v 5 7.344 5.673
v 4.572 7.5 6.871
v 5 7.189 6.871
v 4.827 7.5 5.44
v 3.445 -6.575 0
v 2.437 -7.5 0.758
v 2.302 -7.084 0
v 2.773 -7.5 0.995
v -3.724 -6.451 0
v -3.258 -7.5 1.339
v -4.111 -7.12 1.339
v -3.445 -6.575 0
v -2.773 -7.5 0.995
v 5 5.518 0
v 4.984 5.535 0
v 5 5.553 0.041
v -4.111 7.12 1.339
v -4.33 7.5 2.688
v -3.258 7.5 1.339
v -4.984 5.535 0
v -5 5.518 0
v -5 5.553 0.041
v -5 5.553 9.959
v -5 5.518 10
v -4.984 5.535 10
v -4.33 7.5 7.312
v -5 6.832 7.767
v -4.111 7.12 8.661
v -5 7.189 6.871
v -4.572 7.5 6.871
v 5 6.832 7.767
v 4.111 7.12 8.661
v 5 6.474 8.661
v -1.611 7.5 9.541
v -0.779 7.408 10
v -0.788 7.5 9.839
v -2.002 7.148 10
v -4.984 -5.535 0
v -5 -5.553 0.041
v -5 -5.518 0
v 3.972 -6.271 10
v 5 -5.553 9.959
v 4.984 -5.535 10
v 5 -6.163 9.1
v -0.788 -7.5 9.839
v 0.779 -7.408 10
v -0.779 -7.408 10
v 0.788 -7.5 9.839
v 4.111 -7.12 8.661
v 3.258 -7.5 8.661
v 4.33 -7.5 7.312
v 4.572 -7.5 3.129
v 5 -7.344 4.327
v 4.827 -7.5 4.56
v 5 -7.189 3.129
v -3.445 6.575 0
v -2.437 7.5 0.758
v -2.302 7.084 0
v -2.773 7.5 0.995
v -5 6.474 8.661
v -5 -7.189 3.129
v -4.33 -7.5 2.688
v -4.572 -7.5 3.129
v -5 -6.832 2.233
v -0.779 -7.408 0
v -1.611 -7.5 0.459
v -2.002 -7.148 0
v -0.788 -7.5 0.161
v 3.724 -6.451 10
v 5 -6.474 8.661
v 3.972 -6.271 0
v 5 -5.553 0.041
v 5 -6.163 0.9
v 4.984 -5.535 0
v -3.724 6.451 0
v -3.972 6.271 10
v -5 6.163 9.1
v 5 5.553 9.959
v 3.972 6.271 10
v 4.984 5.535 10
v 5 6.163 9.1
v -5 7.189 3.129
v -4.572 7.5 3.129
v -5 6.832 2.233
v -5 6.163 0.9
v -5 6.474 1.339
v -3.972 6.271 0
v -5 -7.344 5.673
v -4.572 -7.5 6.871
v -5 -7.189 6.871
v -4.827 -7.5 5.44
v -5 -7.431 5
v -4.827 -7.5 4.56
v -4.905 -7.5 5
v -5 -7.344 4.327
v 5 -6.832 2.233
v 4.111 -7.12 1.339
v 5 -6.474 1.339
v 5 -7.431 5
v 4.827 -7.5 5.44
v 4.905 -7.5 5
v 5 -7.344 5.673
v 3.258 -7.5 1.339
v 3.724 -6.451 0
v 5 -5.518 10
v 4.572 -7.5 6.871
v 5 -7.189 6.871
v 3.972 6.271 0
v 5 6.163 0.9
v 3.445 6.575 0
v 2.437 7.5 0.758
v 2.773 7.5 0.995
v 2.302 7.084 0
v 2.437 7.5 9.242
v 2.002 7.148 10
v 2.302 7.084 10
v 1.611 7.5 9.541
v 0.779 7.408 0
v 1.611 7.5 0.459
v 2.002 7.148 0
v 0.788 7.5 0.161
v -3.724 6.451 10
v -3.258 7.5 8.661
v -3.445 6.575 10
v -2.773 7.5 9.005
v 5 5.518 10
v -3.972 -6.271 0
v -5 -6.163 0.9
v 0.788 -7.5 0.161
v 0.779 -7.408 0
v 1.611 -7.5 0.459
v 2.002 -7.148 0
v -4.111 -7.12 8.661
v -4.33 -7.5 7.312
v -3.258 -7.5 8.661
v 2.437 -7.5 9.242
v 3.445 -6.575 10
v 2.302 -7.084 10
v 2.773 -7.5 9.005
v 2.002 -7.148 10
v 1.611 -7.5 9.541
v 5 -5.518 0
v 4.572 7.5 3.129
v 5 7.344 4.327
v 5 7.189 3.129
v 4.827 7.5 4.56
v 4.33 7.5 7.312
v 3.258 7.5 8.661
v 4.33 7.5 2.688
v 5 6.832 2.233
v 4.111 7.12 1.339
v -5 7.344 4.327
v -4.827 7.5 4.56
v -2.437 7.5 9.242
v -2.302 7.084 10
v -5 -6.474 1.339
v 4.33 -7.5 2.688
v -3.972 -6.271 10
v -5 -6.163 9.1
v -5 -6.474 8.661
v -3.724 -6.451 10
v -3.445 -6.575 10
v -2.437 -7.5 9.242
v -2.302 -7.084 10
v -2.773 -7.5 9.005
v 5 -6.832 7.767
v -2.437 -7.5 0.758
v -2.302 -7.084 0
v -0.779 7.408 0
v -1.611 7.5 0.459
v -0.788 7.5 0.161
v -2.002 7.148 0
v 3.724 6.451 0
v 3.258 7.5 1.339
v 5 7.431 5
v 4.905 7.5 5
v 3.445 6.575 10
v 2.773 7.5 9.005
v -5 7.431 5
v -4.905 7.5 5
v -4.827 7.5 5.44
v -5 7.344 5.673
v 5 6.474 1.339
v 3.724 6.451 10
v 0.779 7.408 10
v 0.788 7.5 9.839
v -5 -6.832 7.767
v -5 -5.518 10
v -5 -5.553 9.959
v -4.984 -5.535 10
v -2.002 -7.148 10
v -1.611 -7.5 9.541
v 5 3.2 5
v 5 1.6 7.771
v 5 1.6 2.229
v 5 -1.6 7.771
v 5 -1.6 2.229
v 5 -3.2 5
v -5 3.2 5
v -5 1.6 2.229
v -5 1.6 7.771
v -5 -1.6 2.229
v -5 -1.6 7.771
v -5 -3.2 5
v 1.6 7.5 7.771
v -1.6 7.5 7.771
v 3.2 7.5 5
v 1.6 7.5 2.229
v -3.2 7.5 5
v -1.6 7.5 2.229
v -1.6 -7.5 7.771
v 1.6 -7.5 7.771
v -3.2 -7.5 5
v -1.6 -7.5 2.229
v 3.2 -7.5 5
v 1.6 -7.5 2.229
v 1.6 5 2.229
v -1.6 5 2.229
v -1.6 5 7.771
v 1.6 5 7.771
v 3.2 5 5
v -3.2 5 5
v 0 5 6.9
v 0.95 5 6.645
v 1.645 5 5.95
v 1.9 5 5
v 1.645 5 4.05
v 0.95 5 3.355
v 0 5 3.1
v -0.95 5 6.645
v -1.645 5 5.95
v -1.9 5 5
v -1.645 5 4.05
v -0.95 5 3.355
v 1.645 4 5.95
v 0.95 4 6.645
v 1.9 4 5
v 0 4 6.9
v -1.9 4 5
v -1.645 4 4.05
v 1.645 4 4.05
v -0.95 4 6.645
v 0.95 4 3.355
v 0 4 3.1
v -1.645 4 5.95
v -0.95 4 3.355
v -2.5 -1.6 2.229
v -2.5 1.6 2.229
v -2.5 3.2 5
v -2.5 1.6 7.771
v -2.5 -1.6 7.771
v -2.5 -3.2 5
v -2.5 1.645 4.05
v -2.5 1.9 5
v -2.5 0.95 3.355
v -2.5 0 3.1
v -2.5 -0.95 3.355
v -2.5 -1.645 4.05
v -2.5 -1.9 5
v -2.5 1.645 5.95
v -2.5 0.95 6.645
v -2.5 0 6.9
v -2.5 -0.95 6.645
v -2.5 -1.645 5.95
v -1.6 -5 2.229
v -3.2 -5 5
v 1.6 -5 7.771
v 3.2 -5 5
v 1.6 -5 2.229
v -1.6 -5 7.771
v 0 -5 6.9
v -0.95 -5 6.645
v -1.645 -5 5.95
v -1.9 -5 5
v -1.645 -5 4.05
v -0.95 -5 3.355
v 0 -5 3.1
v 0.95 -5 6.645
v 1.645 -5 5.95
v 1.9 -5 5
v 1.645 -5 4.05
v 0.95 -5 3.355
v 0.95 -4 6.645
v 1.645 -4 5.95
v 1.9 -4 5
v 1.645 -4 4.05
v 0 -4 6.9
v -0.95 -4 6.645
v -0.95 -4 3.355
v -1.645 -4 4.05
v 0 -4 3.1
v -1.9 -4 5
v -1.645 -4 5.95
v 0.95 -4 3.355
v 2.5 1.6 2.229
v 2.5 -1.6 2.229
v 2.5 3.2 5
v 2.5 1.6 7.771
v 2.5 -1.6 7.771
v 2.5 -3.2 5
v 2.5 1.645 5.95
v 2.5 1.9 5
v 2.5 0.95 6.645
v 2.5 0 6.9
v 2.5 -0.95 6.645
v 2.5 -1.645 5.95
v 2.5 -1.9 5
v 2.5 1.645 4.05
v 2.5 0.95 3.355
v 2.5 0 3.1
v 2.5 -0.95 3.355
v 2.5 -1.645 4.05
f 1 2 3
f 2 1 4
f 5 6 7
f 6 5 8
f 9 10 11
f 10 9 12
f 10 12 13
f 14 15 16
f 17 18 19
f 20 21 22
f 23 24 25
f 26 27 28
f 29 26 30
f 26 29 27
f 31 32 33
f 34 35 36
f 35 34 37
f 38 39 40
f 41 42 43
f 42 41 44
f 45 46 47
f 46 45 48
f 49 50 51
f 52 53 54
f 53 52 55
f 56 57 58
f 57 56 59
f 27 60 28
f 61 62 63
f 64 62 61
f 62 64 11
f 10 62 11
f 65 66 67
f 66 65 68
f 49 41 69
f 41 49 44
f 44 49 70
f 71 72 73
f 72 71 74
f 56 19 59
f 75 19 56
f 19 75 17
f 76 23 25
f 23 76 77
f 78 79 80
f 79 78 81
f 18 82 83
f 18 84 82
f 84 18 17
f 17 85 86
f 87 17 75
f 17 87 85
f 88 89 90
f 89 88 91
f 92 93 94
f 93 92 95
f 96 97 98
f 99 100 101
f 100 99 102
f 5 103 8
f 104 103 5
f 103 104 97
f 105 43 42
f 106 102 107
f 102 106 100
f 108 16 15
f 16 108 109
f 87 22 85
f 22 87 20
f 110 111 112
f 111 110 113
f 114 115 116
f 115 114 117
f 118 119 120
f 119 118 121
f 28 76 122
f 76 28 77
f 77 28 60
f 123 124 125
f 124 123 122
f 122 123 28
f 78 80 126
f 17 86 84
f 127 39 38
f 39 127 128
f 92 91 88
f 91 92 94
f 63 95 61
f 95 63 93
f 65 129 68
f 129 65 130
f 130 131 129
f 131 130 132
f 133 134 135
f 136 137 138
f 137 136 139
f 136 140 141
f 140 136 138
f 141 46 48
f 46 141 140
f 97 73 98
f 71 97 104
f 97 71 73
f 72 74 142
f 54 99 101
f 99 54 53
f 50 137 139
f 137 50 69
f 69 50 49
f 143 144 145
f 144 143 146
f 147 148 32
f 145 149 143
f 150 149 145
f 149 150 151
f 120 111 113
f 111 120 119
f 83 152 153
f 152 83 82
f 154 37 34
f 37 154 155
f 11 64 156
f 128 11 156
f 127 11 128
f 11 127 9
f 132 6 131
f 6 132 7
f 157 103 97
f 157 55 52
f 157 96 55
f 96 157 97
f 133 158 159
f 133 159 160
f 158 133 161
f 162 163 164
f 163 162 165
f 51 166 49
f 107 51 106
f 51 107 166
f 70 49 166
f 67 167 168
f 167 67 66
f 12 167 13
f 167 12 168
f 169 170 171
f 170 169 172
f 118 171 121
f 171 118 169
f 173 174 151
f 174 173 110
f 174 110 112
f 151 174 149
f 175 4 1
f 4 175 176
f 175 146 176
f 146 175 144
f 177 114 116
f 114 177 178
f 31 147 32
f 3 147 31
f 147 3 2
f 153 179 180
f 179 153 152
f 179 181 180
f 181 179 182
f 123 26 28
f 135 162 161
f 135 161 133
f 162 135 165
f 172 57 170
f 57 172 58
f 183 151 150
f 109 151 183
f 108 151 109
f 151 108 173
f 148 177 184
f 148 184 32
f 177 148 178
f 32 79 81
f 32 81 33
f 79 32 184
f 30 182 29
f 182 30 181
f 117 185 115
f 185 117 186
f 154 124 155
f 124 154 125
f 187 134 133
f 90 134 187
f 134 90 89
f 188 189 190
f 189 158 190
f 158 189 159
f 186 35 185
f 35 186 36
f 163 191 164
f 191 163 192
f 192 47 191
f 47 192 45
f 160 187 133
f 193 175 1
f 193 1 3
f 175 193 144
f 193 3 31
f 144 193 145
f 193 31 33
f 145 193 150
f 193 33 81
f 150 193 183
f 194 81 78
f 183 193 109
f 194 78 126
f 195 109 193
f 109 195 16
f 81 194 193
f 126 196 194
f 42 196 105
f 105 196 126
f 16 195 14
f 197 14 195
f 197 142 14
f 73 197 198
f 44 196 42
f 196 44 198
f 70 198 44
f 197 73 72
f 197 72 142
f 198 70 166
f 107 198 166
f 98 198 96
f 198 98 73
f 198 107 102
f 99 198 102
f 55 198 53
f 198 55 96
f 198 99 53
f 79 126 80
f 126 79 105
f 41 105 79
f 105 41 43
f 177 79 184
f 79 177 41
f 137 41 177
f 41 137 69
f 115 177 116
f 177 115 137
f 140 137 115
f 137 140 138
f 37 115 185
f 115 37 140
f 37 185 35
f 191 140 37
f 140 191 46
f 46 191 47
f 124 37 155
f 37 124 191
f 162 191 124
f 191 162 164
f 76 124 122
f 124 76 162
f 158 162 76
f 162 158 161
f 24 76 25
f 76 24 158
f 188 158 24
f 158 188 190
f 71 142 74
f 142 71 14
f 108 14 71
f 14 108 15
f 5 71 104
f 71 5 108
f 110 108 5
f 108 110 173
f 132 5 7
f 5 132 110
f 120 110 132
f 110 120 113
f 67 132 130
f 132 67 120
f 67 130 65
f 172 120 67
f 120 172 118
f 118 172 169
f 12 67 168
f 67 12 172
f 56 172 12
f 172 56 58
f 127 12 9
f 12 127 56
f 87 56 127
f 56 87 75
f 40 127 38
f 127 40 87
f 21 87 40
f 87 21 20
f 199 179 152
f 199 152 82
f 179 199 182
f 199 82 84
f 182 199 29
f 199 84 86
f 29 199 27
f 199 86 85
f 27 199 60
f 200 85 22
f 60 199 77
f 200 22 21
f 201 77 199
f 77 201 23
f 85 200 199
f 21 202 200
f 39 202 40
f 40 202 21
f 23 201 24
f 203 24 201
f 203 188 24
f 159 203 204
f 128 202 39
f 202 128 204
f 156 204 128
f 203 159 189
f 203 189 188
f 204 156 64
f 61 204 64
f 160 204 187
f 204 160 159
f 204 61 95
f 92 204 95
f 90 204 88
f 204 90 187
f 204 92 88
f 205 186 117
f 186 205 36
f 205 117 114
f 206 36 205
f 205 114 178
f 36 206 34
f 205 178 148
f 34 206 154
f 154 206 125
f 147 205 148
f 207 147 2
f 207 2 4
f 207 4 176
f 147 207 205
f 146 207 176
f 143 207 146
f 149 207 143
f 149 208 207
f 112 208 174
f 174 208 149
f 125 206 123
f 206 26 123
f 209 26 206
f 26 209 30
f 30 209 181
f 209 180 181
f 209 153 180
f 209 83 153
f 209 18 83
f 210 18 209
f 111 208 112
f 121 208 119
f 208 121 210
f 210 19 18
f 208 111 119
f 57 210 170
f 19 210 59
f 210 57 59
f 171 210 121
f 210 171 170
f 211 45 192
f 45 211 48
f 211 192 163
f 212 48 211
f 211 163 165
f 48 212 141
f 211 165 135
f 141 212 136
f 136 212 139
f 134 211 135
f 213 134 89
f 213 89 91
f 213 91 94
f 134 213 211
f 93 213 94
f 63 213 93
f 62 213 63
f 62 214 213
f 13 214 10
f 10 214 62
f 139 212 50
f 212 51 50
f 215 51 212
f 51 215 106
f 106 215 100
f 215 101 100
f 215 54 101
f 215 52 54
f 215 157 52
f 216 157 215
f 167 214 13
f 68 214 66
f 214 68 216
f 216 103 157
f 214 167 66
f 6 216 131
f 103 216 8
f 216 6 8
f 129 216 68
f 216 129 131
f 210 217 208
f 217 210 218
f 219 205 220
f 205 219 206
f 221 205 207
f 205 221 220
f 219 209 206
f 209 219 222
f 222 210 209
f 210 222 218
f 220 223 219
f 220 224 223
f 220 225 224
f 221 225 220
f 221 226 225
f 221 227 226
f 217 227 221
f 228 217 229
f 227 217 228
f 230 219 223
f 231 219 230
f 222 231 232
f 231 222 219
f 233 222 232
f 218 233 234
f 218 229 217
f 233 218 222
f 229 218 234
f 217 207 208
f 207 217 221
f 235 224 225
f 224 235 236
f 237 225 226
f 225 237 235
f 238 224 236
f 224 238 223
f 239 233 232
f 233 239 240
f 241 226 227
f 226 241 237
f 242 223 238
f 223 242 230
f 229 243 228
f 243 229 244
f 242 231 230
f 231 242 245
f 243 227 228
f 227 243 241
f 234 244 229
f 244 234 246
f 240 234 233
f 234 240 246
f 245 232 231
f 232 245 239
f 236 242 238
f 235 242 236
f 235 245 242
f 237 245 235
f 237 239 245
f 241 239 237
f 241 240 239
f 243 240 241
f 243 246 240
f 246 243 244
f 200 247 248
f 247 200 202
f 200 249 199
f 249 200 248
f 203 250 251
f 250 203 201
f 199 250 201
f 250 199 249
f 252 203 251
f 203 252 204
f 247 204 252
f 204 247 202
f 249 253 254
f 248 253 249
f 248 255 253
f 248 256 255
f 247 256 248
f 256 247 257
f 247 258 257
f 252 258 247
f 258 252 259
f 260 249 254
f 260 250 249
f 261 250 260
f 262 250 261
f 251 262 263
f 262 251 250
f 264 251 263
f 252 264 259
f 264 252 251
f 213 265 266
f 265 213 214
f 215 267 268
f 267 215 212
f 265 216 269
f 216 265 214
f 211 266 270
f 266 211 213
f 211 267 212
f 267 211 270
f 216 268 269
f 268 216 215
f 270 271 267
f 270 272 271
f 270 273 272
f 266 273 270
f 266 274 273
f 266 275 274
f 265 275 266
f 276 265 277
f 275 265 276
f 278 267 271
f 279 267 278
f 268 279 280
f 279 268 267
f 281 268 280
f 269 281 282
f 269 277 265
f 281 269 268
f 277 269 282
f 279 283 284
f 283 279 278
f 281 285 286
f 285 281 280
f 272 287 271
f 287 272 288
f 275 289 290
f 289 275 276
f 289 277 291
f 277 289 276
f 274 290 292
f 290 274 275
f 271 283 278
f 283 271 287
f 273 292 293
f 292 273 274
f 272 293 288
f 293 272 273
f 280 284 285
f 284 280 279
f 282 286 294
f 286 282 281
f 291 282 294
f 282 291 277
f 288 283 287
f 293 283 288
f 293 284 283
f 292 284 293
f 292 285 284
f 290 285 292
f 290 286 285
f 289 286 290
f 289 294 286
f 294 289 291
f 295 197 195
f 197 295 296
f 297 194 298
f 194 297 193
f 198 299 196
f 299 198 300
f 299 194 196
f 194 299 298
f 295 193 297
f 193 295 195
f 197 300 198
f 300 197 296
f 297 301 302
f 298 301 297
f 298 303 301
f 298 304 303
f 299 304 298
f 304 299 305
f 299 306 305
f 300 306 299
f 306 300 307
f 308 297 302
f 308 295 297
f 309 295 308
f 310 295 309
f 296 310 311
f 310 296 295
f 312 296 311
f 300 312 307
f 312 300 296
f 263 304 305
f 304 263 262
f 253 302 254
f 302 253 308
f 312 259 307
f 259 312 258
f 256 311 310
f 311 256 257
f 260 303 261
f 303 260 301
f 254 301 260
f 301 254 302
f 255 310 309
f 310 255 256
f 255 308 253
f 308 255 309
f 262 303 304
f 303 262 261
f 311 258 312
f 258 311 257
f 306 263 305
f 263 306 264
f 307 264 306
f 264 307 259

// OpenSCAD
width = 10;
length = 15;
height = width;

hole_radius = 1.9;
nut_radius = 3.2;

module joint() {
  difference() {
    intersection() {
      sphere(r=0.6*length, $fn=30);
      cube([width, length, height], center=true);
    }
    rotate([0, 90, 0])
      cylinder(r=hole_radius, h=length+1, center=true, $fn=12);
    for (a = [0, 180]) {
      rotate([0, 0, a]) translate([0, length/2, 0]) rotate([90, 0, 0])
	cylinder(r=nut_radius, h=5, center=true, $fn=6);
      rotate([0, 0, a]) translate([0, length/2, 0]) rotate([90, 0, 0])
	cylinder(r=hole_radius, h=7, center=true, $fn=12);
      rotate([0, 0, a+90]) translate([0, width/2, 0]) rotate([90, 0, 0])
	cylinder(r=nut_radius, h=5, center=true, $fn=6);
    }
  }
}

translate([0, 0, height/2])
joint();
